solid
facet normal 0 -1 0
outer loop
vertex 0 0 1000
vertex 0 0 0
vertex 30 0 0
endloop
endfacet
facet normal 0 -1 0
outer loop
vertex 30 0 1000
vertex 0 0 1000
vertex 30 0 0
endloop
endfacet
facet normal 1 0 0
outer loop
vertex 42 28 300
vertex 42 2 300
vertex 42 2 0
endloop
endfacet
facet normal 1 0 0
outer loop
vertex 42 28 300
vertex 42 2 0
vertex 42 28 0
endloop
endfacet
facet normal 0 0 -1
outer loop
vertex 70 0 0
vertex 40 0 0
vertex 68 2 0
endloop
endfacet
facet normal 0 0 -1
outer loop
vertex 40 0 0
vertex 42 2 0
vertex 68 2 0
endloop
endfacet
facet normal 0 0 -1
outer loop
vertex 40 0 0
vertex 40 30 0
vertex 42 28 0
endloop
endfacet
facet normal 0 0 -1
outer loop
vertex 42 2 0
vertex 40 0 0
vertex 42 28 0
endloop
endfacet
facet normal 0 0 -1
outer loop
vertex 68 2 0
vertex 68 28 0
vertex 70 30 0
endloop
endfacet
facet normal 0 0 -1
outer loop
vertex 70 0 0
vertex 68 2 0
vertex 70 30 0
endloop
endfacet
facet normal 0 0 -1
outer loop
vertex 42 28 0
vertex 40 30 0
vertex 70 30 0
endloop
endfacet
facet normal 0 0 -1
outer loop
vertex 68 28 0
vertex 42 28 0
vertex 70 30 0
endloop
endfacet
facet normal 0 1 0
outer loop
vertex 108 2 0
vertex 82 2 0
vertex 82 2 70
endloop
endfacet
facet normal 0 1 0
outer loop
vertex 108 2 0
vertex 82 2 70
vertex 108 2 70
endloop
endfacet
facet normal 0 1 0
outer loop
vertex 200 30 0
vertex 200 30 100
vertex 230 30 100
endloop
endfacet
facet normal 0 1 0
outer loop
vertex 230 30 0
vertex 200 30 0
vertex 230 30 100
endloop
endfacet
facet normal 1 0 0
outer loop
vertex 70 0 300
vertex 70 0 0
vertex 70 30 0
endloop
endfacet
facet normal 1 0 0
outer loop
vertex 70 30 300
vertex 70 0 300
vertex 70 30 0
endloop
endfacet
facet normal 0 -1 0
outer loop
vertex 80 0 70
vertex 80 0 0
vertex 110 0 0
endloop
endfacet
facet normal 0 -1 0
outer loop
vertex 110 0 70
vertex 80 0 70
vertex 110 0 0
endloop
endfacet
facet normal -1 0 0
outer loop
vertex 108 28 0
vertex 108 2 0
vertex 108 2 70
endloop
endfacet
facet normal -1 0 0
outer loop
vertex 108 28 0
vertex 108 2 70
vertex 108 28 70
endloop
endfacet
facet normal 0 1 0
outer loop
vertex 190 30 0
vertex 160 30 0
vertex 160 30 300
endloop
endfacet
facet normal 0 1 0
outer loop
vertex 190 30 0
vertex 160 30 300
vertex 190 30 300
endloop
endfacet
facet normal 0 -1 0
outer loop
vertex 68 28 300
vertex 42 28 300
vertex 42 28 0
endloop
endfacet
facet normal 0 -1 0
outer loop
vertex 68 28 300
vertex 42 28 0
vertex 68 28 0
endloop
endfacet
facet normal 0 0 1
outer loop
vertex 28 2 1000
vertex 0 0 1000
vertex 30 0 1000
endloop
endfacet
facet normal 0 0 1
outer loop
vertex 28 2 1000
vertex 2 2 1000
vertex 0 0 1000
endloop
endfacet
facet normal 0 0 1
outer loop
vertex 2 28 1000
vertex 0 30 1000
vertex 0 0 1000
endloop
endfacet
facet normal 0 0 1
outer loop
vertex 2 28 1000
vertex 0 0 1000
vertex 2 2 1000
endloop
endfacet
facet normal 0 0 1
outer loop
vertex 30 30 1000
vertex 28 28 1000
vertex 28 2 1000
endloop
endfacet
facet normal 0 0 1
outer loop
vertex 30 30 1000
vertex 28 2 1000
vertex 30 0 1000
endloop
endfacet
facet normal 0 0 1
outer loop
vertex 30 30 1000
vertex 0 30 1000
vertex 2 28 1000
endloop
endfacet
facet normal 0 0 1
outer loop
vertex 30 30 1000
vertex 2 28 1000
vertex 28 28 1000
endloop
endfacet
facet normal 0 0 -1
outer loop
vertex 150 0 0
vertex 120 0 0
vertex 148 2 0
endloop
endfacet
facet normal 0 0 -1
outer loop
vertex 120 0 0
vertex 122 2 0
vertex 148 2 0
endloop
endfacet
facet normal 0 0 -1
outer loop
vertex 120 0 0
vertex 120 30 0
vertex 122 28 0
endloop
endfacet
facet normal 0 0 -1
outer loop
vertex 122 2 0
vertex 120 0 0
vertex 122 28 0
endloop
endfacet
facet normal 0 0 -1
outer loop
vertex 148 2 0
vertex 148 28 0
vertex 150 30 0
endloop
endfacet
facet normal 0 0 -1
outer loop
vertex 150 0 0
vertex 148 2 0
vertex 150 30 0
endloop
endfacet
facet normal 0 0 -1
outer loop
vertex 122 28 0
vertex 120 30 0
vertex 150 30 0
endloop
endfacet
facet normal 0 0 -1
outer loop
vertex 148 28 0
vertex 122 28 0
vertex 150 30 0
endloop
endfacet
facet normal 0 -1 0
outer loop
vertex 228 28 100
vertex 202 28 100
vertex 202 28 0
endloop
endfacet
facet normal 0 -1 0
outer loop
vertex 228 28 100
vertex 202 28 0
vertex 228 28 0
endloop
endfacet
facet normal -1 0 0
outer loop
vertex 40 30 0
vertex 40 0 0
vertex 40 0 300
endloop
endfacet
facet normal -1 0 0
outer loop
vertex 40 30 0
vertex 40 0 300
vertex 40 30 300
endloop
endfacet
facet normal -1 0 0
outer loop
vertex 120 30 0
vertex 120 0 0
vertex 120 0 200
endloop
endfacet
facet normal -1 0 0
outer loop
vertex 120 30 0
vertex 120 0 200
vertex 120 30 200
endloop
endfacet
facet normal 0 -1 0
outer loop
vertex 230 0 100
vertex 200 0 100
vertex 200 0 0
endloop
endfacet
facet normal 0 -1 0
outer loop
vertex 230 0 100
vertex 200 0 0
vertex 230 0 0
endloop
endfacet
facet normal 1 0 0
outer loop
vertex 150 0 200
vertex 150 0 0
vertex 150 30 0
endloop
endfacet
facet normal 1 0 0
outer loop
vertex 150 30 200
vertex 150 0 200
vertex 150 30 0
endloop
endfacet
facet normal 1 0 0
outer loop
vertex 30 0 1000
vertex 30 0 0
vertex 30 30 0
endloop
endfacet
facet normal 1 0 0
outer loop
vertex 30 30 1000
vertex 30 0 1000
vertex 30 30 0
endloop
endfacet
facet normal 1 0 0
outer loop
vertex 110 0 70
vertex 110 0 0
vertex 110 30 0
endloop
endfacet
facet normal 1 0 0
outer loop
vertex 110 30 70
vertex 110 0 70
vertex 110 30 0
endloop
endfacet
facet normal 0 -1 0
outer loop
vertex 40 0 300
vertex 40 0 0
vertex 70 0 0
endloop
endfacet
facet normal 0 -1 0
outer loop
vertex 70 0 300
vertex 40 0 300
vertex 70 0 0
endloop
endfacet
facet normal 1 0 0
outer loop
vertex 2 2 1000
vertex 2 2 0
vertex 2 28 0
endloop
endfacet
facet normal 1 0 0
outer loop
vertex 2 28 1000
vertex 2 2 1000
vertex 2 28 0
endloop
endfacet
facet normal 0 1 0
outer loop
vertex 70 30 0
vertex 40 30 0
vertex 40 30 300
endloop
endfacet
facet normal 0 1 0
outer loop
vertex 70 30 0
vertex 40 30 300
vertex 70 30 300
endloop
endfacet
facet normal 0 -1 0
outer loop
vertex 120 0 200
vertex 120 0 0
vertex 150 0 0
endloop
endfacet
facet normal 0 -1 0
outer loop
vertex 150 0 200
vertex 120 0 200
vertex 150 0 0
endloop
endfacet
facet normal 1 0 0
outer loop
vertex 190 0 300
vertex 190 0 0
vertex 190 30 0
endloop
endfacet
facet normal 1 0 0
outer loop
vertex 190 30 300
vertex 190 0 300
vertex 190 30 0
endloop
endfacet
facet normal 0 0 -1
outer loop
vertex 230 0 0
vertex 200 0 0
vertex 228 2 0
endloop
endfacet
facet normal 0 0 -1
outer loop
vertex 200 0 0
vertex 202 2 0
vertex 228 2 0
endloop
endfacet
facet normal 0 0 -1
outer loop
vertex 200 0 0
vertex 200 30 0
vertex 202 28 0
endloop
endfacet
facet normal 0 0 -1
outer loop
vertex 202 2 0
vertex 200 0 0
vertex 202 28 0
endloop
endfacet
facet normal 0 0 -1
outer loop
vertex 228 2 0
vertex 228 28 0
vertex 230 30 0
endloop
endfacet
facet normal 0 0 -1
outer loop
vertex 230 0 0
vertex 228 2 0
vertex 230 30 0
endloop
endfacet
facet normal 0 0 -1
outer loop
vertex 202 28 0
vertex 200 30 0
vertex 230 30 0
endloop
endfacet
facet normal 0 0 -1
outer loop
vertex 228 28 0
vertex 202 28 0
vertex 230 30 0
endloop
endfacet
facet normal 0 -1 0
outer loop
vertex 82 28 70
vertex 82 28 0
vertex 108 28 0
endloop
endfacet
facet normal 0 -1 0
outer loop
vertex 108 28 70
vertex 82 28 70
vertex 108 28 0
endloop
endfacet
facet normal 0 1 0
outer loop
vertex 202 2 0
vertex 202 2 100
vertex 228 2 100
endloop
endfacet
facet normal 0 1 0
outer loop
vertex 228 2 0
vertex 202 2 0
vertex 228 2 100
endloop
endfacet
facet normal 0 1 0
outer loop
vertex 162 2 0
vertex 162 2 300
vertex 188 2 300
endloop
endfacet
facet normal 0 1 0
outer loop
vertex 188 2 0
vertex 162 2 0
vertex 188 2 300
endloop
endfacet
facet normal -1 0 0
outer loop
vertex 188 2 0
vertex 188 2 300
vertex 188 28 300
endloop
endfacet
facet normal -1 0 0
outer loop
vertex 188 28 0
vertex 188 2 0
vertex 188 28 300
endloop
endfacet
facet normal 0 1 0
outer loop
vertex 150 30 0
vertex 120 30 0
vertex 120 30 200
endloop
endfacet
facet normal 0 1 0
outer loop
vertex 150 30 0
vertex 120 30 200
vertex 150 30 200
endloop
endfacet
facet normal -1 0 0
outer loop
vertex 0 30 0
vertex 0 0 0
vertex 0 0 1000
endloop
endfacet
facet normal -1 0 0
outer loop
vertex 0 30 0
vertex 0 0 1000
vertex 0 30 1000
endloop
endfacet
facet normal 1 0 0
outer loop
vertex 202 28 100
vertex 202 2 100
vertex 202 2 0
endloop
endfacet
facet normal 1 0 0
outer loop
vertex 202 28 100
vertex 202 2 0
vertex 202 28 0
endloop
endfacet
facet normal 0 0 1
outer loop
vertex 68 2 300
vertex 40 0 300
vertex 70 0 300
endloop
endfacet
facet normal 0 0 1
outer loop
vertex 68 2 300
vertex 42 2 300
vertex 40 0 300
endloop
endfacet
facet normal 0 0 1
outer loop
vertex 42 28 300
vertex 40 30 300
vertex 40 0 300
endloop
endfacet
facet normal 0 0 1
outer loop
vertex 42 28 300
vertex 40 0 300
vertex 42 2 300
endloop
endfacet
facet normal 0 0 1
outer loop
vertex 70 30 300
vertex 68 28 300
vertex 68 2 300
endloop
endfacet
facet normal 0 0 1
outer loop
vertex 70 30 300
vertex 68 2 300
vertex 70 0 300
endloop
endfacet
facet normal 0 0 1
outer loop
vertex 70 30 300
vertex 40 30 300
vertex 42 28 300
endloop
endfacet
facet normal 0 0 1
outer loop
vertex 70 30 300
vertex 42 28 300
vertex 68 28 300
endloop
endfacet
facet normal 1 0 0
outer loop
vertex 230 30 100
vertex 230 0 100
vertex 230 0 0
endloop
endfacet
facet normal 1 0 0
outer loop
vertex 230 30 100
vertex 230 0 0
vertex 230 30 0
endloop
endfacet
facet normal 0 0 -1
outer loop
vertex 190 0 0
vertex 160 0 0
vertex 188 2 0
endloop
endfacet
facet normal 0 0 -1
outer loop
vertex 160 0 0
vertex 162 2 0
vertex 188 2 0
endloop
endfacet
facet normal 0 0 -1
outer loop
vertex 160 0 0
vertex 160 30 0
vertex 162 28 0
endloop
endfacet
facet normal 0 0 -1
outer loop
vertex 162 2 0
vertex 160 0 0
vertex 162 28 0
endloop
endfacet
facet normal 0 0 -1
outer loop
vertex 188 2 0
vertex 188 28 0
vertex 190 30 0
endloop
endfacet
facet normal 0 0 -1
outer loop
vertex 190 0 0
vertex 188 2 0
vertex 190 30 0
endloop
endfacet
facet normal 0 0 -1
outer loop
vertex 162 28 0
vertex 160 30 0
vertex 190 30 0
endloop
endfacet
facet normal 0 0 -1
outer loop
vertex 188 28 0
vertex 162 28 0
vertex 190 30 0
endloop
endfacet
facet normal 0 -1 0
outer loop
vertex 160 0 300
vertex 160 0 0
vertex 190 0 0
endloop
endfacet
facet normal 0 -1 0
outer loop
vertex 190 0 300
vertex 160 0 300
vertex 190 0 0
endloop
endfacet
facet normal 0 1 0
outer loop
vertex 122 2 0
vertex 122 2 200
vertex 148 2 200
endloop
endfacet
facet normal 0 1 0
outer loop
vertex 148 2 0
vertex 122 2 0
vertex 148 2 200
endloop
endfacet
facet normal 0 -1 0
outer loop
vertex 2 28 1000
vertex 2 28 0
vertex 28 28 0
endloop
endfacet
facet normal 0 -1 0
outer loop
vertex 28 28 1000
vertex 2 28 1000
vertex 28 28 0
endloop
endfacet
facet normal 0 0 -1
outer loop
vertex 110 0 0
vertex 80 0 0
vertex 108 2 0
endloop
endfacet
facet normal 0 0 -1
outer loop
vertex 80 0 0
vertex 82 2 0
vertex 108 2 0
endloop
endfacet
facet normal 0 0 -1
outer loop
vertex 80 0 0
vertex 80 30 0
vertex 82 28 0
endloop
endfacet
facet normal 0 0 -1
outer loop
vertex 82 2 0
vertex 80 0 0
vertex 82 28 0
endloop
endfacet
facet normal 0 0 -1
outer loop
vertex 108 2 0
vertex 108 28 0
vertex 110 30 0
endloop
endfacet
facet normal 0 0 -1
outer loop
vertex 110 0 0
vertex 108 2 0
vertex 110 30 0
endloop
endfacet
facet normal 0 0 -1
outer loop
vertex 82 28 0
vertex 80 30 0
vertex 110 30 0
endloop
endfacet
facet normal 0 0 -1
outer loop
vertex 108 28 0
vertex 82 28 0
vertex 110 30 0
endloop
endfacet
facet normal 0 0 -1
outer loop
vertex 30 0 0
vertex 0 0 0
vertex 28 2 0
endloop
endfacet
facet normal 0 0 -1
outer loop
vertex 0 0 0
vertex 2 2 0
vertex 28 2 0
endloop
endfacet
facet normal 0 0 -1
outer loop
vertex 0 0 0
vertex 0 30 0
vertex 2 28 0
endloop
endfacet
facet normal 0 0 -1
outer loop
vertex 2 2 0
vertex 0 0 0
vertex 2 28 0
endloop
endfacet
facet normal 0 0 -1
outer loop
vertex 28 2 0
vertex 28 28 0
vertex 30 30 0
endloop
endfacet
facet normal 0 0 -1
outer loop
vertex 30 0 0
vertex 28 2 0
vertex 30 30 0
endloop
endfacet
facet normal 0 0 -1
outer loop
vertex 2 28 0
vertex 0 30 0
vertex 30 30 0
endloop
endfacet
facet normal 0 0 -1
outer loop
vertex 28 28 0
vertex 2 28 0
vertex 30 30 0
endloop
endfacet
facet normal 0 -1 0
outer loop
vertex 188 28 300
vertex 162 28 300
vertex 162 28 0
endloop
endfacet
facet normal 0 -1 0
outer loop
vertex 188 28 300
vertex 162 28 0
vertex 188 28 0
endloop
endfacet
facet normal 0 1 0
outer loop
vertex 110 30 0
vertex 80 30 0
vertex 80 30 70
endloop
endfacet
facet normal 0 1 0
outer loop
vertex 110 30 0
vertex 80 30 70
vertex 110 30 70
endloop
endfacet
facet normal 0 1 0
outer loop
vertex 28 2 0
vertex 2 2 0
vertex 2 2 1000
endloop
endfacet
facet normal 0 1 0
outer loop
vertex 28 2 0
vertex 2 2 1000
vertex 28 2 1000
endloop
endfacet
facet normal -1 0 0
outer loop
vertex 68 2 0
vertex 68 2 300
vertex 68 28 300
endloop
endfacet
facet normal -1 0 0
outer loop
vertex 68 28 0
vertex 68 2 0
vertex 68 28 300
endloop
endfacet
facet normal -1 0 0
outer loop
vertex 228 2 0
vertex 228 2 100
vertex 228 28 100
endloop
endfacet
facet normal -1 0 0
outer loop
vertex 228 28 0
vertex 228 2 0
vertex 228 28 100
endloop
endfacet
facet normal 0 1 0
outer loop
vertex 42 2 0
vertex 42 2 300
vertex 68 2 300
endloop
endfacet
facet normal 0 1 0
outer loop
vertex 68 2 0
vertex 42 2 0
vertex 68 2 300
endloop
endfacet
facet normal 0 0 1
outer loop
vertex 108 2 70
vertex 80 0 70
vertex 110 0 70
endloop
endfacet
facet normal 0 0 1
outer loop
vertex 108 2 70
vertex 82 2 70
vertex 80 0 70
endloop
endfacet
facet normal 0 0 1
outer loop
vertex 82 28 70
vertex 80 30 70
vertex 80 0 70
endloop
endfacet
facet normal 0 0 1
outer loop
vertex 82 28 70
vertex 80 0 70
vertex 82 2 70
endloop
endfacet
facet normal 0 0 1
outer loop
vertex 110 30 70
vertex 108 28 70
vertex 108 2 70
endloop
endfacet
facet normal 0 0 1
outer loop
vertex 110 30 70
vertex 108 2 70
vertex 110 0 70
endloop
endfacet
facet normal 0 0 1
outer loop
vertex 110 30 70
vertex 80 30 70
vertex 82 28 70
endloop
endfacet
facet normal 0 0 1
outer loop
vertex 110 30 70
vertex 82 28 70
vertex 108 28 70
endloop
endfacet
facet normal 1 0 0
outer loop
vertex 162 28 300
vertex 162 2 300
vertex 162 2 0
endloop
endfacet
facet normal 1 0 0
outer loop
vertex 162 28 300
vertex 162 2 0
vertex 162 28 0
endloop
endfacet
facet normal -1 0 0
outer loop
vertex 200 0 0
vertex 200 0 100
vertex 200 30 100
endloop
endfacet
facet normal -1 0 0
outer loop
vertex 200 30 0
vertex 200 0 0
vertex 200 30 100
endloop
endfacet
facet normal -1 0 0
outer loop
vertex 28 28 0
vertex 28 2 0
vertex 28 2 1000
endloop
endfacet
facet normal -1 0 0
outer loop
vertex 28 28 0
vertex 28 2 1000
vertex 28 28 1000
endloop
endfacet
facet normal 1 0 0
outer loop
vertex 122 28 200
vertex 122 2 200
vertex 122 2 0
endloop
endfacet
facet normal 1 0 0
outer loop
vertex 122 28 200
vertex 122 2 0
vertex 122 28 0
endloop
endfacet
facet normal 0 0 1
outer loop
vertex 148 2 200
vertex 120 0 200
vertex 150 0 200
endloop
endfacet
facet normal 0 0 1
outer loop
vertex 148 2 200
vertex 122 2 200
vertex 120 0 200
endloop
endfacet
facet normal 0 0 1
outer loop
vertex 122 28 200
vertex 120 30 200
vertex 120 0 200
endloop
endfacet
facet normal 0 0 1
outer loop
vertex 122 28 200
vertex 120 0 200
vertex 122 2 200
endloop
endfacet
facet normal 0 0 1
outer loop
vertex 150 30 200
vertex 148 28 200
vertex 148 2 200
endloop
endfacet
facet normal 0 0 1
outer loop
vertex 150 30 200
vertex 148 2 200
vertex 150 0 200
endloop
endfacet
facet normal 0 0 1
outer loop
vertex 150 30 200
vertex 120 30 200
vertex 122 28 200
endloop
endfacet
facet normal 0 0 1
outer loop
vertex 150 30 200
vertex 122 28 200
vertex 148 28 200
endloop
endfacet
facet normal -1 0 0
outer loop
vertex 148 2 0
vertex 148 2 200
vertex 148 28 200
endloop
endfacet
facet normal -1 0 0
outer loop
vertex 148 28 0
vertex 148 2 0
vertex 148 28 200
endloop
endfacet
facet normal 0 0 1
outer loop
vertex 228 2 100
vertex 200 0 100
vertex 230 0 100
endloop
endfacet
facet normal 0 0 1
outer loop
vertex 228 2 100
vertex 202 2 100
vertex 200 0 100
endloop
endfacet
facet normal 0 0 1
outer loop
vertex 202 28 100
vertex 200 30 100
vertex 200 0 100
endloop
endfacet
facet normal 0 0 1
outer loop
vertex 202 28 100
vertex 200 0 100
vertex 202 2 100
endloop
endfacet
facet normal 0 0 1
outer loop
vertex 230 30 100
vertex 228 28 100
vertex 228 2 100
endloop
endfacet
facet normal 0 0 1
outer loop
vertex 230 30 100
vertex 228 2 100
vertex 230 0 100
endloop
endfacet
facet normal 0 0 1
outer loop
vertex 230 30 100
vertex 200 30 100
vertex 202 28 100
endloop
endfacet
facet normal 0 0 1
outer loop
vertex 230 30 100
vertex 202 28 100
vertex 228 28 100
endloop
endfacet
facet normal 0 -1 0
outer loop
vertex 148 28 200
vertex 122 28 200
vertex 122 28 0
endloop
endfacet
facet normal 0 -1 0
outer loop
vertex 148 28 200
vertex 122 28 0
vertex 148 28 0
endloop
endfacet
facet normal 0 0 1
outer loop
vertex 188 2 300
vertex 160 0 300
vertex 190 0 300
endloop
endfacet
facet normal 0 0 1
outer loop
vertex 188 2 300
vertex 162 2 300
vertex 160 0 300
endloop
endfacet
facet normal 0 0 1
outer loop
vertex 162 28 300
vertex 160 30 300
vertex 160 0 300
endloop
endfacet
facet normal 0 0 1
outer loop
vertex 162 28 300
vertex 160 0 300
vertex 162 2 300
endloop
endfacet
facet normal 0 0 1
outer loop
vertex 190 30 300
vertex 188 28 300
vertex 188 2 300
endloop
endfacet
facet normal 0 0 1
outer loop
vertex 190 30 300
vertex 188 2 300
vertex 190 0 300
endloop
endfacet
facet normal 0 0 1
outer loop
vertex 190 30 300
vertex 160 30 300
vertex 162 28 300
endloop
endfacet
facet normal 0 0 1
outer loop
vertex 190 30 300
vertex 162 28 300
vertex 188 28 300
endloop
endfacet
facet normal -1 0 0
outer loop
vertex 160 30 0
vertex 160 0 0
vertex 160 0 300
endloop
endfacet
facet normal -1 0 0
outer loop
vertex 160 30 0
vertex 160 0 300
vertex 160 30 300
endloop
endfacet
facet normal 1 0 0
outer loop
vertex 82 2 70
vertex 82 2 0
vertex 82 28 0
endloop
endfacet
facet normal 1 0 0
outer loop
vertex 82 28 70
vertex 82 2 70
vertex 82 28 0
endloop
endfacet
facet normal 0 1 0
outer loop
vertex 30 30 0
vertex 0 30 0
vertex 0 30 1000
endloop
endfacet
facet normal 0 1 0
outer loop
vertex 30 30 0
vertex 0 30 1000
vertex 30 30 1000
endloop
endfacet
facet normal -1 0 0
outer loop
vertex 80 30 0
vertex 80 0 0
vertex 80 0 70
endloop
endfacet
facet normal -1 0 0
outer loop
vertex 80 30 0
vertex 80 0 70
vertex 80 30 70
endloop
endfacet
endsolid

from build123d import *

# Parameters (mm, degrees)
F6_W      = 30
F6_H      = 30
F6_W_2    = 26
F6_H_2    = 26
F7_DEPTH  = 1000
F8_DEPTH  = 300
F9_DEPTH  = 70
F10_DEPTH = 200
F11_DEPTH = 300
F12_DEPTH = 100


with BuildPart() as f7:
    # F6 (on Top) → F7 (new body)
    with BuildSketch(Plane.XY):
        with Locations((15, 15)):
            Rectangle(F6_W, F6_H)
        with Locations((15, 15)):
            Rectangle(F6_W_2, F6_H_2, mode=Mode.SUBTRACT)
    extrude(amount=F7_DEPTH)


with BuildPart() as f8:
    # F6 (on Top) → F8 (new body)
    with BuildSketch(Plane.XY):
        with Locations((55, 15)):
            Rectangle(F6_W, F6_H)
        with Locations((55, 15)):
            Rectangle(F6_W_2, F6_H_2, mode=Mode.SUBTRACT)
    extrude(amount=F8_DEPTH)


with BuildPart() as f9:
    # F6 (on Top) → F9 (new body)
    with BuildSketch(Plane.XY):
        with Locations((95, 15)):
            Rectangle(F6_W, F6_H)
        with Locations((95, 15)):
            Rectangle(F6_W_2, F6_H_2, mode=Mode.SUBTRACT)
    extrude(amount=F9_DEPTH)


with BuildPart() as f10:
    # F6 (on Top) → F10 (new body)
    with BuildSketch(Plane.XY):
        with Locations((135, 15)):
            Rectangle(F6_W, F6_H)
        with Locations((135, 15)):
            Rectangle(F6_W_2, F6_H_2, mode=Mode.SUBTRACT)
    extrude(amount=F10_DEPTH)


with BuildPart() as f11:
    # F6 (on Top) → F11 (new body)
    with BuildSketch(Plane.XY):
        with Locations((175, 15)):
            Rectangle(F6_W, F6_H)
        with Locations((175, 15)):
            Rectangle(F6_W_2, F6_H_2, mode=Mode.SUBTRACT)
    extrude(amount=F11_DEPTH)


with BuildPart() as f12:
    # F6 (on Top) → F12 (new body)
    with BuildSketch(Plane.XY):
        with Locations((215, 15)):
            Rectangle(F6_W, F6_H)
        with Locations((215, 15)):
            Rectangle(F6_W_2, F6_H_2, mode=Mode.SUBTRACT)
    extrude(amount=F12_DEPTH)


solid = Compound([f7.part, f8.part, f9.part, f10.part, f11.part, f12.part])
